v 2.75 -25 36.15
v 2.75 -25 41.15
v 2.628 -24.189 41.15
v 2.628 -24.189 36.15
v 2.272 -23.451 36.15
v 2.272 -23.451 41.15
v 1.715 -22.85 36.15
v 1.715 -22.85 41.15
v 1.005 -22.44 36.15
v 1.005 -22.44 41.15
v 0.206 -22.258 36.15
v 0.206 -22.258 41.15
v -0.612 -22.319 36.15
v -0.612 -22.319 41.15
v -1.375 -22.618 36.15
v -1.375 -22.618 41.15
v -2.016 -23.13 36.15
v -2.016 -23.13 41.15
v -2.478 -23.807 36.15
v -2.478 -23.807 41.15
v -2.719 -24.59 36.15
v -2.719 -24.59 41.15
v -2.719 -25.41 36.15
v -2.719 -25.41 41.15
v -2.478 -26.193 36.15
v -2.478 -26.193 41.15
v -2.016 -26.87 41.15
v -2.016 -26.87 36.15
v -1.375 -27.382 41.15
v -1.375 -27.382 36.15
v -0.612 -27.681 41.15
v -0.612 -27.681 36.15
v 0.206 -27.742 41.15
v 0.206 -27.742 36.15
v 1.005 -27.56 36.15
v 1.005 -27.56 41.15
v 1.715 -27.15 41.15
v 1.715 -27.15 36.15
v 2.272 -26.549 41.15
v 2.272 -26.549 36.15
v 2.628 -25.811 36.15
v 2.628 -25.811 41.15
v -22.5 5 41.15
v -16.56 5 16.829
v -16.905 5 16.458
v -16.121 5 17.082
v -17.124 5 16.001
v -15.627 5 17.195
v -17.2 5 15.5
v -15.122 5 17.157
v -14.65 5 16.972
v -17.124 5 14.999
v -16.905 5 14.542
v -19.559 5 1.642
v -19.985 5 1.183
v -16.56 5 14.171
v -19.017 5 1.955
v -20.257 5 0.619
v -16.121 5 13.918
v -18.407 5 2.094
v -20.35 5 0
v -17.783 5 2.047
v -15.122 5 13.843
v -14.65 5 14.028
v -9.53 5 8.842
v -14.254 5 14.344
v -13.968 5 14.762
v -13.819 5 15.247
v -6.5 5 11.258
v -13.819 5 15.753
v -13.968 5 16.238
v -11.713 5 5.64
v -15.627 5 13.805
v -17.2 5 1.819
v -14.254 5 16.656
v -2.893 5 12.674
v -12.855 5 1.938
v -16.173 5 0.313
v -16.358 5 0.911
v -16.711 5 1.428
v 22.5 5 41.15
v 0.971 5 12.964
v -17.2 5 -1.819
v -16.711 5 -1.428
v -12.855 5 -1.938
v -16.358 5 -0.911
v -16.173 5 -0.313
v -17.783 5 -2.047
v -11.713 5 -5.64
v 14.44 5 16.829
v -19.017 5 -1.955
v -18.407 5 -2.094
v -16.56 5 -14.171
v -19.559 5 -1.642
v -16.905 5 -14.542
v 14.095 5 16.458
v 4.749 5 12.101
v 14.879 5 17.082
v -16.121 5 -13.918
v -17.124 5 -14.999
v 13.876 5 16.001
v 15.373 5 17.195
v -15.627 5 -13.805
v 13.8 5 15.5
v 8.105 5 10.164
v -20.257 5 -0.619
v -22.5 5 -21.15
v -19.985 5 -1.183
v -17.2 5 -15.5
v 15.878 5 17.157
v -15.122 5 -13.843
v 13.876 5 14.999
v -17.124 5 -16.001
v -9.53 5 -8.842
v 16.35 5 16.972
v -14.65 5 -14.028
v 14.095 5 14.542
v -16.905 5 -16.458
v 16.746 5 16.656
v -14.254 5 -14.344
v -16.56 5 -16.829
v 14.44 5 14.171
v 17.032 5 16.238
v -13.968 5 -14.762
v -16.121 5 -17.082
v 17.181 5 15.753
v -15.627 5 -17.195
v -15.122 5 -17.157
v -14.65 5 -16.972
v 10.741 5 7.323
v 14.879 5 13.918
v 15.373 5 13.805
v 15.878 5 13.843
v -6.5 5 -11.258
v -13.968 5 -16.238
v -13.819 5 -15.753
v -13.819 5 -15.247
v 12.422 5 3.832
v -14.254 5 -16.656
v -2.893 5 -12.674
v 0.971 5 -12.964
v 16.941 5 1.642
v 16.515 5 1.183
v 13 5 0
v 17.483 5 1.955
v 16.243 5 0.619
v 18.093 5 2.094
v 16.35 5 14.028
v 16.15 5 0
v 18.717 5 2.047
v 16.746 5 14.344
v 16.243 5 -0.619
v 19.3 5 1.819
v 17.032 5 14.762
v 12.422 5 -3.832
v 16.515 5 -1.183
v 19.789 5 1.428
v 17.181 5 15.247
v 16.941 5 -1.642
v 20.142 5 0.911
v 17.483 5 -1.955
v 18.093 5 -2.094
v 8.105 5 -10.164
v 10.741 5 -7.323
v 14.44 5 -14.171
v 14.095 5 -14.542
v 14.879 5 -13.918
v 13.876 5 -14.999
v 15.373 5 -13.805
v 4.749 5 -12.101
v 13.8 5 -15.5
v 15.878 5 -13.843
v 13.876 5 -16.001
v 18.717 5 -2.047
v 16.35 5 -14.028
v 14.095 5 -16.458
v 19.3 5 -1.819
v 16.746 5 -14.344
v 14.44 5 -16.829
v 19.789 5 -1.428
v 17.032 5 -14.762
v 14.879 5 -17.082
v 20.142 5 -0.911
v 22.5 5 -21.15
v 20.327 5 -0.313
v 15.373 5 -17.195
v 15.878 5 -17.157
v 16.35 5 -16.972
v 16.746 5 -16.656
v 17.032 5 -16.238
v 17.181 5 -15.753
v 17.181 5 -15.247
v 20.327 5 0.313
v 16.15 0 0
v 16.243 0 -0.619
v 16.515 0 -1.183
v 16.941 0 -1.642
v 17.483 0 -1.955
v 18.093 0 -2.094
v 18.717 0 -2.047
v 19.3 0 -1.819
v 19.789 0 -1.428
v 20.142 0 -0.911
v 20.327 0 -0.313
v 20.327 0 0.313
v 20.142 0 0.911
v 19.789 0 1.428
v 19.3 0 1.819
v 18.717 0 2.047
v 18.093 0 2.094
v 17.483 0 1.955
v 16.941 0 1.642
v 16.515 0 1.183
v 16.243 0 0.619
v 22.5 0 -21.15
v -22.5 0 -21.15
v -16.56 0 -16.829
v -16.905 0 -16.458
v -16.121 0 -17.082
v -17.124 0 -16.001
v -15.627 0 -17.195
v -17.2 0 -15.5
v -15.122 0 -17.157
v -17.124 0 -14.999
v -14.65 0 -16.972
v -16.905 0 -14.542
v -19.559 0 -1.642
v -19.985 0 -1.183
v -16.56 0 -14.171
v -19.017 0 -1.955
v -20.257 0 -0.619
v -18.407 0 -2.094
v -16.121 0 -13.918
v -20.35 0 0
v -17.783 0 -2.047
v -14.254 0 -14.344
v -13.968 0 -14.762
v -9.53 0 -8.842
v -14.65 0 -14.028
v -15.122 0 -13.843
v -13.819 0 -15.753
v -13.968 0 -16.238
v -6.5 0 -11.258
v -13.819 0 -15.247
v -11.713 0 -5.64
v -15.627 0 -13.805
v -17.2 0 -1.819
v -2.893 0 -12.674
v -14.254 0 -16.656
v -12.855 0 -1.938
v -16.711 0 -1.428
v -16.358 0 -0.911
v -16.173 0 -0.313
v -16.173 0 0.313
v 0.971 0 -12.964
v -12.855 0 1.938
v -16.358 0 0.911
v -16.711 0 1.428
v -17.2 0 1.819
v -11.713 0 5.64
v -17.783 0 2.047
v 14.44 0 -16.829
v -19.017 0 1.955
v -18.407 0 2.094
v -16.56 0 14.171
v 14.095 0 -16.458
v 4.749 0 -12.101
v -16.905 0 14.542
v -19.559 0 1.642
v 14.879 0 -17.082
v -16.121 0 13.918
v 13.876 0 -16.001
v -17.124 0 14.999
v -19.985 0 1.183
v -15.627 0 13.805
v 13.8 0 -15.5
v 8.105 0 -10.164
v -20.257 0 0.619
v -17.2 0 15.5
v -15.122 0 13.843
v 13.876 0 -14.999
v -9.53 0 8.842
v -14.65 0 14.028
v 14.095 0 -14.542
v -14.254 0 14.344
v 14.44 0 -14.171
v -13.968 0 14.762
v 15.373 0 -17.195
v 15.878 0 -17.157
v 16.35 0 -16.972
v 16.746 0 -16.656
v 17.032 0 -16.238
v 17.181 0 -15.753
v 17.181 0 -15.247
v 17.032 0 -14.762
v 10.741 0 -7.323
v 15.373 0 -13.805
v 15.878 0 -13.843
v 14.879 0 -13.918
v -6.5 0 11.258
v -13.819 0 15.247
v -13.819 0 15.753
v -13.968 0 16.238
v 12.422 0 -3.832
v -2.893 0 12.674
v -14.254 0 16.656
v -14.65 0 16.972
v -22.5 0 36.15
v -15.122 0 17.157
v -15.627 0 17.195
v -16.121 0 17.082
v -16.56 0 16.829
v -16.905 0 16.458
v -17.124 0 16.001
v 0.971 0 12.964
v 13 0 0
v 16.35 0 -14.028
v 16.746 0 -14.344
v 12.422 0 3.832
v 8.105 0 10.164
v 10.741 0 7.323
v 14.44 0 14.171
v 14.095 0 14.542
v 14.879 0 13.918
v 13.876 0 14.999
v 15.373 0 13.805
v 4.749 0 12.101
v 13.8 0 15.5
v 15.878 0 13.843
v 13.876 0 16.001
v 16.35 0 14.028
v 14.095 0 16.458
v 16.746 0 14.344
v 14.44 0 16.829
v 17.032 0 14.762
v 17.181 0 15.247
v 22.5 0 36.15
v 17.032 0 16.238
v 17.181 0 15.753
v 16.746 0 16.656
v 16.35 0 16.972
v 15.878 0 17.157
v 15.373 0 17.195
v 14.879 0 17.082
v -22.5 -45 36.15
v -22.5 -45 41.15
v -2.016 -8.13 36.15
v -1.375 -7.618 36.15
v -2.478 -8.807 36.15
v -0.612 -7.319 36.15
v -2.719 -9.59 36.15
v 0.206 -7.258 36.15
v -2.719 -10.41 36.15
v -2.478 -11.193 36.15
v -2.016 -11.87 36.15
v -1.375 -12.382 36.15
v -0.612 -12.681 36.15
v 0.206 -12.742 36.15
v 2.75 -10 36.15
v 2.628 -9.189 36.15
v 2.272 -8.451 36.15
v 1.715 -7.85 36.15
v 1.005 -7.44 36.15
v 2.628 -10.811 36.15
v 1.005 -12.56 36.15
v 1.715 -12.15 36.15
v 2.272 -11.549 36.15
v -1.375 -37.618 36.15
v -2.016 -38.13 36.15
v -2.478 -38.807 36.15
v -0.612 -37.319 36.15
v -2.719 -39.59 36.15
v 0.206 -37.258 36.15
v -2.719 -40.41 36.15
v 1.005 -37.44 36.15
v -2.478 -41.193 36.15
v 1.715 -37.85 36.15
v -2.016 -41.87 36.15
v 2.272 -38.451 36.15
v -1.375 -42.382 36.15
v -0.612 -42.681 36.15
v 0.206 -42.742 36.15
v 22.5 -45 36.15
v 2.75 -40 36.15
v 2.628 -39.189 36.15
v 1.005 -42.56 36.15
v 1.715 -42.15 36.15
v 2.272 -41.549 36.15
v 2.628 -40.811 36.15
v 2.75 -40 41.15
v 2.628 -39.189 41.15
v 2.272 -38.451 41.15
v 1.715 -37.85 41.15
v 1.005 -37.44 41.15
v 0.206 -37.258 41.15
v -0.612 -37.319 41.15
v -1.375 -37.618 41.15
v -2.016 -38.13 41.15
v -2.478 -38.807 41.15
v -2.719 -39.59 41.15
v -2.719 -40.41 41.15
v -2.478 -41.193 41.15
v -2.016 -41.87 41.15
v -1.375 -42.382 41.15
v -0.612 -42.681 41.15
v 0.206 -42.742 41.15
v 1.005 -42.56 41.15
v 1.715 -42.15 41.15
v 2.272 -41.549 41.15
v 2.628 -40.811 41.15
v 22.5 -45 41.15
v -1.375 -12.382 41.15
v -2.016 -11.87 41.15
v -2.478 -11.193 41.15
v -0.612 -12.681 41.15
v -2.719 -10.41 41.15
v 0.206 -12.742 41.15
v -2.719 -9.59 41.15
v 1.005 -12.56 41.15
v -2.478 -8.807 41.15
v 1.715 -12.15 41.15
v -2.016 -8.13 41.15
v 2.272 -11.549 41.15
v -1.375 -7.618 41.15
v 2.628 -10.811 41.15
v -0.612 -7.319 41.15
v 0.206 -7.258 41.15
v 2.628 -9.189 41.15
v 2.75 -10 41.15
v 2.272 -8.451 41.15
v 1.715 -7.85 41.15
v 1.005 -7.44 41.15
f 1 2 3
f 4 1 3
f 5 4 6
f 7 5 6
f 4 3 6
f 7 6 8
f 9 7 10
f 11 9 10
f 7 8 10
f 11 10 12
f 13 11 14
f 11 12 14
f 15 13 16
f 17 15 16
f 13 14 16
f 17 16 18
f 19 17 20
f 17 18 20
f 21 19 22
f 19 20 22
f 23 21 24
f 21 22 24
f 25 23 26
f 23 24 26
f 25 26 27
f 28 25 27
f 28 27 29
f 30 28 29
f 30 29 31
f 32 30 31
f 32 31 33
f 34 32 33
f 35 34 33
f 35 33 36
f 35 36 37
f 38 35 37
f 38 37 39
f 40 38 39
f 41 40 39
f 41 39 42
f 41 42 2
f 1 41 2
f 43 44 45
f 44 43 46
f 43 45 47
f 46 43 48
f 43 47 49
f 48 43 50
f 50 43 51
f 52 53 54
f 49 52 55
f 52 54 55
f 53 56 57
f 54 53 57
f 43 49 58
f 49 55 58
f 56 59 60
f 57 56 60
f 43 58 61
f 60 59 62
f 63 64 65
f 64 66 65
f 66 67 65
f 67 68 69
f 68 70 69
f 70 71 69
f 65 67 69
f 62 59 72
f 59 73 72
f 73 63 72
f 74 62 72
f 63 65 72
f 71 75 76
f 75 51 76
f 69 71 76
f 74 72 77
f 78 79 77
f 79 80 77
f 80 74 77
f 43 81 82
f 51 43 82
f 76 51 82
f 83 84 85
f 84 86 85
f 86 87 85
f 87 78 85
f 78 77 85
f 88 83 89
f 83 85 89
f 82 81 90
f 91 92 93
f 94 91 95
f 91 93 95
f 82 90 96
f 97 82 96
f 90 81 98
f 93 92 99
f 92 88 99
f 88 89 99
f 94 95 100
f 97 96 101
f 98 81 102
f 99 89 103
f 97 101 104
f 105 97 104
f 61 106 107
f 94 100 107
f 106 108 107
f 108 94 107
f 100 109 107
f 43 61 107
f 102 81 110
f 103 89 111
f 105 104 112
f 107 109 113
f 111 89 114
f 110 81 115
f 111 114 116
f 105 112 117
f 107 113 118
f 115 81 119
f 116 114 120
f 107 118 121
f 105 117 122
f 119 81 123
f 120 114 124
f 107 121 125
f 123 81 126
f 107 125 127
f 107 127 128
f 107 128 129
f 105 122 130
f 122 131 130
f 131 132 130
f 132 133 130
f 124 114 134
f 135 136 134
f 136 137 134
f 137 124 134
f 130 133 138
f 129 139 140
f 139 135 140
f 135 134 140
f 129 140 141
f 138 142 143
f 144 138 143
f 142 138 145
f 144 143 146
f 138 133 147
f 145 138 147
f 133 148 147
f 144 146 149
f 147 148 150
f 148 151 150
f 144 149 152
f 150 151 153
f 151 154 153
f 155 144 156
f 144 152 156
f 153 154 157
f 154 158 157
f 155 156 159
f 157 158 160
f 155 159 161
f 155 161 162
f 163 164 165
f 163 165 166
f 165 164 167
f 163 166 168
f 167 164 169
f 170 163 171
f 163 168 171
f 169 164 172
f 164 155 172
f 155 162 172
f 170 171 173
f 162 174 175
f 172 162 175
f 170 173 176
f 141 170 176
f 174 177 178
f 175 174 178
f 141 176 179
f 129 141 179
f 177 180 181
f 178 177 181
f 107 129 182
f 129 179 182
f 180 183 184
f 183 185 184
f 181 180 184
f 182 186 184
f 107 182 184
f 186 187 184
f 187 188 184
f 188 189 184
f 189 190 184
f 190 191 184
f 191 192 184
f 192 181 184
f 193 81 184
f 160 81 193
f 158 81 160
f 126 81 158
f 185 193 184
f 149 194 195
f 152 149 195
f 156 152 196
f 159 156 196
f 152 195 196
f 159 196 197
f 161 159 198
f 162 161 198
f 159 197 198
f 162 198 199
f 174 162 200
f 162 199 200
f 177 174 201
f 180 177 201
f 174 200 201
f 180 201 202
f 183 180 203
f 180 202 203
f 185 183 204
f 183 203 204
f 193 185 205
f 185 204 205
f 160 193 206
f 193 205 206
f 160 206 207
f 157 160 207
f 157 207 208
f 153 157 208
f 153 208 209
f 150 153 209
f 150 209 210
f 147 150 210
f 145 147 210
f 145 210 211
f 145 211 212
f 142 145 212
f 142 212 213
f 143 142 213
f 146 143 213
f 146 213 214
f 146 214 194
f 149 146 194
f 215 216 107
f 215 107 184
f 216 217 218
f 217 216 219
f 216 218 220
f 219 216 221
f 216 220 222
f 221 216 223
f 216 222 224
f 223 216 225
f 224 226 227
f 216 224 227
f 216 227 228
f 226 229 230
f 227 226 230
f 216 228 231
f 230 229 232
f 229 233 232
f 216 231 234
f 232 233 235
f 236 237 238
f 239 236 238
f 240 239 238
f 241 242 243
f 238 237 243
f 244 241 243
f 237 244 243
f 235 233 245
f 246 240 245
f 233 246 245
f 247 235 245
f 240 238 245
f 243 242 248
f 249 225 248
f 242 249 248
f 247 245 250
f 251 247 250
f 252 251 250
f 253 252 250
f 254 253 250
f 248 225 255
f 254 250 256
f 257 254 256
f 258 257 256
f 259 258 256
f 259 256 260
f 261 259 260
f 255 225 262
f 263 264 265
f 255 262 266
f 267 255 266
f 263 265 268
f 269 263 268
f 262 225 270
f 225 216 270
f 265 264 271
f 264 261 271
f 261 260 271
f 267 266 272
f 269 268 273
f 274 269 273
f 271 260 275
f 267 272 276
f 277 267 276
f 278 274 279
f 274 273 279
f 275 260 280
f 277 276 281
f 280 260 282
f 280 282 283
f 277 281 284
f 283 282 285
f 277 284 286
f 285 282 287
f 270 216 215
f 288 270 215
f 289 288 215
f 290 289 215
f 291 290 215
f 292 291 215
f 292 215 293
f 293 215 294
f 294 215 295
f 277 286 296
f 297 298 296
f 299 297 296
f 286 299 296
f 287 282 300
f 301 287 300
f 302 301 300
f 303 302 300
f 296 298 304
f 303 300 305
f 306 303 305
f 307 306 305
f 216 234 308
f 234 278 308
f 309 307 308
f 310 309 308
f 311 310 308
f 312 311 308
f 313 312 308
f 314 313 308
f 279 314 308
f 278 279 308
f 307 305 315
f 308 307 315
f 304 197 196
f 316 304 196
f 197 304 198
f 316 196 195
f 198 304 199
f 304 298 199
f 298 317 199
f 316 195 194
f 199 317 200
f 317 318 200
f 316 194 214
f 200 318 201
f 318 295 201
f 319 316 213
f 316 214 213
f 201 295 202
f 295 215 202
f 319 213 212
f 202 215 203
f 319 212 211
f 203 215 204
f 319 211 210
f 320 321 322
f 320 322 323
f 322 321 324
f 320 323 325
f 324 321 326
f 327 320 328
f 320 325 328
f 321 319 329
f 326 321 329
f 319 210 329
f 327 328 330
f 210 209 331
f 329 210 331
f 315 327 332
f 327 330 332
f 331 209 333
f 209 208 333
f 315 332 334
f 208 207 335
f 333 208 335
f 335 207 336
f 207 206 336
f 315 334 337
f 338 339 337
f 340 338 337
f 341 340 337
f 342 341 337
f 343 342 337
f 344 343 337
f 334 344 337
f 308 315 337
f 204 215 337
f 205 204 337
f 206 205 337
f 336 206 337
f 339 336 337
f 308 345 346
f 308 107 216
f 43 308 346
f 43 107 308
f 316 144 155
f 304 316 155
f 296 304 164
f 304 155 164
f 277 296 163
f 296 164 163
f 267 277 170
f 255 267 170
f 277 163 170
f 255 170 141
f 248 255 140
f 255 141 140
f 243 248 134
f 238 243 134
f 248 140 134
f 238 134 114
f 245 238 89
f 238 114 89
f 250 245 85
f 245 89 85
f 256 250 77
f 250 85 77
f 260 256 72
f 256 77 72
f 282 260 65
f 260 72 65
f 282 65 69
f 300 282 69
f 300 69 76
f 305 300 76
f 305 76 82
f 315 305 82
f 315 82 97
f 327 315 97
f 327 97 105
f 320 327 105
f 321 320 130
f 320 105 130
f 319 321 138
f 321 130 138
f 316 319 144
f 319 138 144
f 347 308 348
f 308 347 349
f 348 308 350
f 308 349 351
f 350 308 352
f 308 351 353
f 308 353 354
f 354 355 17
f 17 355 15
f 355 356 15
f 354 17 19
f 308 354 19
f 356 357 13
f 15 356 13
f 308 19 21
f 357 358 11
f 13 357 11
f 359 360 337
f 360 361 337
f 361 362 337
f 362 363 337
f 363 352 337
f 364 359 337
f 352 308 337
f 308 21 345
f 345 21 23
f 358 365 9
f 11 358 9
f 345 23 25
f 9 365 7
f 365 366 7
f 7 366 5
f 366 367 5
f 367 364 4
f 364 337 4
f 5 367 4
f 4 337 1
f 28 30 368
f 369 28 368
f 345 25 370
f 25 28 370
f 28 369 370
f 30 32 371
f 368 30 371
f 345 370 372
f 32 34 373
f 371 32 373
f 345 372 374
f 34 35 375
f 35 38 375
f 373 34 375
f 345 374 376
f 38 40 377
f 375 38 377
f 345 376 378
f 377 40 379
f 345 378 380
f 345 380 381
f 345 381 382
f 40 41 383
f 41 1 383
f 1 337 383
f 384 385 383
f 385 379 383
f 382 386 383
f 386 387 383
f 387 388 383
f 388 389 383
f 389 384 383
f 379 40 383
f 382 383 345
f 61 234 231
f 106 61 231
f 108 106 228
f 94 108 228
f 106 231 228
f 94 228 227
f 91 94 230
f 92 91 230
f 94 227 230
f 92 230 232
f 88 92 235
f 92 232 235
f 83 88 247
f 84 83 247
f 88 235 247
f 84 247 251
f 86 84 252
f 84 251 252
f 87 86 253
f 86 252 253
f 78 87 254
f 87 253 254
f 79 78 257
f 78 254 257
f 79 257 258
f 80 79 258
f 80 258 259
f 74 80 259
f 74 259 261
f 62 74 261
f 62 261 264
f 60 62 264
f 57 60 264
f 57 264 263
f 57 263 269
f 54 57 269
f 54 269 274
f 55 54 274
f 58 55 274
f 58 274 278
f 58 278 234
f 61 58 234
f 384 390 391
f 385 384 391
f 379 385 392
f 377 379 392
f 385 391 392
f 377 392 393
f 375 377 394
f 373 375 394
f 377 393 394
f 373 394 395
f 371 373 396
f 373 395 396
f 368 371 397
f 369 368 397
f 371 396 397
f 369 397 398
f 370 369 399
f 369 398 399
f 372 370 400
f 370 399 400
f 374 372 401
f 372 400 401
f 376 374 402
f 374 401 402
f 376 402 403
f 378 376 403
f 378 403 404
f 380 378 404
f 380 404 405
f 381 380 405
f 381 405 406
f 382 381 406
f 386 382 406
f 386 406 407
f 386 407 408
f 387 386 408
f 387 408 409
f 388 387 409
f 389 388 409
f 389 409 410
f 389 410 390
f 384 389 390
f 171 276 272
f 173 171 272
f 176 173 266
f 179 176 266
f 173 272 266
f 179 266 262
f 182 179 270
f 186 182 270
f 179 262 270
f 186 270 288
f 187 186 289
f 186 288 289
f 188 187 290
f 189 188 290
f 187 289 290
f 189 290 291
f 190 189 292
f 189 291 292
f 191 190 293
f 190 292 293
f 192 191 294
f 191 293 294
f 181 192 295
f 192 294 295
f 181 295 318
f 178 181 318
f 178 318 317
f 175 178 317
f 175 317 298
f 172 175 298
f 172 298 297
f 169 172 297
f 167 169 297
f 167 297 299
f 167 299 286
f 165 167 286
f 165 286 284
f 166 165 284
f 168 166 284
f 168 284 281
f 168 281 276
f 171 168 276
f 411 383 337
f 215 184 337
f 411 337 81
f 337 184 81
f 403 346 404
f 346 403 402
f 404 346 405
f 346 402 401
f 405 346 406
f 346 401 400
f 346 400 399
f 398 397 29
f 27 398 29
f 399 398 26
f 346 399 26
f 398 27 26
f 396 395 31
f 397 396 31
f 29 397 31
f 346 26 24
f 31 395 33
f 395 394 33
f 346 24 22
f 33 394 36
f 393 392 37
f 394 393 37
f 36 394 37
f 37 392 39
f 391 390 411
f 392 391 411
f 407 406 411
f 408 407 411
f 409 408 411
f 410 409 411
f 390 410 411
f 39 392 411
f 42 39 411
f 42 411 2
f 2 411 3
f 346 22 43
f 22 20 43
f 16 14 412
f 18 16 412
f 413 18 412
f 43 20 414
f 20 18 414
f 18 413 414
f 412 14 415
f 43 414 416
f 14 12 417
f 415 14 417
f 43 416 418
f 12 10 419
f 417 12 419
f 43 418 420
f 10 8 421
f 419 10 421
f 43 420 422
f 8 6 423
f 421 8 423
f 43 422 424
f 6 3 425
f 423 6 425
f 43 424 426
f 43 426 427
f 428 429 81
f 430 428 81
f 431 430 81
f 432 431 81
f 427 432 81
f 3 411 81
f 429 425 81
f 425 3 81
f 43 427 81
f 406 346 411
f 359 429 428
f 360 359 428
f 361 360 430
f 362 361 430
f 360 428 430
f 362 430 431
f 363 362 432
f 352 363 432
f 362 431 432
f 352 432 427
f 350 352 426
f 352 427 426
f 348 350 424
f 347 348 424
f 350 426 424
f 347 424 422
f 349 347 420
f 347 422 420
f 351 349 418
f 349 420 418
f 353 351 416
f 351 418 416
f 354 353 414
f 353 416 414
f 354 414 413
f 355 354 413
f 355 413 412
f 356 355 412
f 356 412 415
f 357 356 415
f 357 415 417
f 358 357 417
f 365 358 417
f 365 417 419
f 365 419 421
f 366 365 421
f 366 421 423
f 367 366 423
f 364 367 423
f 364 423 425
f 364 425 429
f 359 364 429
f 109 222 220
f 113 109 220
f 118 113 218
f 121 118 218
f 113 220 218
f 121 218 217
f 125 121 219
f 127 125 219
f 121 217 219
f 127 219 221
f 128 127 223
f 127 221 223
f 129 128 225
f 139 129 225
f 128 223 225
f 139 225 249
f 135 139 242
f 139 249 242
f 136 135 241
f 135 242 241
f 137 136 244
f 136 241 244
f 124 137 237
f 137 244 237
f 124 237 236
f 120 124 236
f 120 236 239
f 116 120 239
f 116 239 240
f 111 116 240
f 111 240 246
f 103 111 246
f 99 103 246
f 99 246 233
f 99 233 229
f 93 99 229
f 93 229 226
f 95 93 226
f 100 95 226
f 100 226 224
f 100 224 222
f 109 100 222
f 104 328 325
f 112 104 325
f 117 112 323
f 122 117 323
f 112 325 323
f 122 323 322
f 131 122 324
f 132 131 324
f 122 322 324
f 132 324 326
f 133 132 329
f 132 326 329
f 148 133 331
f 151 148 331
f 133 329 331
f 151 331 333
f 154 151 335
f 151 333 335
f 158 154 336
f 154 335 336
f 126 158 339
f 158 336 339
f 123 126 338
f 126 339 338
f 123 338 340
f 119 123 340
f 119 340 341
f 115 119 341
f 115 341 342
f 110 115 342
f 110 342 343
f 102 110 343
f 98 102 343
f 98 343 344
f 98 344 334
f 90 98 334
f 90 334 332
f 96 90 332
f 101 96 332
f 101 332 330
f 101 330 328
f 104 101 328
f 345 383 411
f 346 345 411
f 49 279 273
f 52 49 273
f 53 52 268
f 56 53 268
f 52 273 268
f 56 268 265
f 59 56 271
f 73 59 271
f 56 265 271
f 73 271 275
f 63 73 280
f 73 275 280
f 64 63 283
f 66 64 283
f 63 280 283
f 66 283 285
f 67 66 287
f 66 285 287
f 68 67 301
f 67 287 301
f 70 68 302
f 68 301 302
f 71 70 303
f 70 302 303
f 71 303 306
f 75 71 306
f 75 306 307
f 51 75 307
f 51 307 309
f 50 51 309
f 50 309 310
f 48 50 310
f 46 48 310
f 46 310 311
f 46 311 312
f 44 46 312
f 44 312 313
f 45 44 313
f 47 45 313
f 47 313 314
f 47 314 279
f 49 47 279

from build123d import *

# Parameters (mm, degrees)
SKETCH2_W             = 45
SKETCH2_H             = 42.3
BOSS_EXTRUDE1_DEPTH   = 5
BOSS_EXTRUDE2_DEPTH   = 45
M5_CLEARANCE_HOLE1_D  = 5.5
SKETCH6_R             = 13
CUT_EXTRUDE1_DEPTH    = 5
M3_CLEARANCE_HOLE1_D  = 3.4
M5X0_8_TAPPED_HOLE1_D = 4.2


with BuildPart() as part:
    # Sketch2 → Boss-Extrude1 (new body)
    with BuildSketch(Plane(origin=(0, 0, 0), x_dir=(1, 0, 0), z_dir=(0, 1, 0))):
        Rectangle(SKETCH2_W, SKETCH2_H)
    extrude(amount=BOSS_EXTRUDE1_DEPTH)

    # Sketch3 → Boss-Extrude2 (add, through all)
    with BuildSketch(Plane(origin=(22.5, 0, 0), x_dir=(0, 0, -1), z_dir=(1, 0, 0))):
        Polygon((-21.15, 0), (-36.15, 0), (-36.15, -45), (-41.15, -45), (-41.15, 5), (-21.15, 5), align=None)
    extrude(amount=-BOSS_EXTRUDE2_DEPTH)

    # M5 Clearance Hole1 (through all)
    with Locations(Plane(origin=(0, 0, 36.15), x_dir=(-1, 0, 0), z_dir=(0, 0, -1))):
        with Locations((0, -10), (0, -25), (0, -40)):
            Hole(M5_CLEARANCE_HOLE1_D / 2)

    # Sketch6 → Cut-Extrude1 (cut)
    with BuildSketch(Plane(origin=(0, 5, 0), x_dir=(1, 0, 0), z_dir=(0, 1, 0))):
        Circle(SKETCH6_R)
    extrude(amount=-CUT_EXTRUDE1_DEPTH, mode=Mode.SUBTRACT)

    # M3 Clearance Hole1 (through all)
    with Locations(Plane(origin=(0, 5, 0), x_dir=(1, 0, 0), z_dir=(0, 1, 0))):
        with Locations((-15.5, 15.5), (-15.5, -15.5), (15.5, -15.5), (15.5, 15.5)):
            Hole(M3_CLEARANCE_HOLE1_D / 2)

    # M5x0.8 Tapped Hole1 (through all)
    with Locations(Plane(origin=(0, 5, 0), x_dir=(1, 0, 0), z_dir=(0, 1, 0))):
        with Locations((-18.25, 0), (18.25, 0)):
            Hole(M5X0_8_TAPPED_HOLE1_D / 2)


solid = part.part
